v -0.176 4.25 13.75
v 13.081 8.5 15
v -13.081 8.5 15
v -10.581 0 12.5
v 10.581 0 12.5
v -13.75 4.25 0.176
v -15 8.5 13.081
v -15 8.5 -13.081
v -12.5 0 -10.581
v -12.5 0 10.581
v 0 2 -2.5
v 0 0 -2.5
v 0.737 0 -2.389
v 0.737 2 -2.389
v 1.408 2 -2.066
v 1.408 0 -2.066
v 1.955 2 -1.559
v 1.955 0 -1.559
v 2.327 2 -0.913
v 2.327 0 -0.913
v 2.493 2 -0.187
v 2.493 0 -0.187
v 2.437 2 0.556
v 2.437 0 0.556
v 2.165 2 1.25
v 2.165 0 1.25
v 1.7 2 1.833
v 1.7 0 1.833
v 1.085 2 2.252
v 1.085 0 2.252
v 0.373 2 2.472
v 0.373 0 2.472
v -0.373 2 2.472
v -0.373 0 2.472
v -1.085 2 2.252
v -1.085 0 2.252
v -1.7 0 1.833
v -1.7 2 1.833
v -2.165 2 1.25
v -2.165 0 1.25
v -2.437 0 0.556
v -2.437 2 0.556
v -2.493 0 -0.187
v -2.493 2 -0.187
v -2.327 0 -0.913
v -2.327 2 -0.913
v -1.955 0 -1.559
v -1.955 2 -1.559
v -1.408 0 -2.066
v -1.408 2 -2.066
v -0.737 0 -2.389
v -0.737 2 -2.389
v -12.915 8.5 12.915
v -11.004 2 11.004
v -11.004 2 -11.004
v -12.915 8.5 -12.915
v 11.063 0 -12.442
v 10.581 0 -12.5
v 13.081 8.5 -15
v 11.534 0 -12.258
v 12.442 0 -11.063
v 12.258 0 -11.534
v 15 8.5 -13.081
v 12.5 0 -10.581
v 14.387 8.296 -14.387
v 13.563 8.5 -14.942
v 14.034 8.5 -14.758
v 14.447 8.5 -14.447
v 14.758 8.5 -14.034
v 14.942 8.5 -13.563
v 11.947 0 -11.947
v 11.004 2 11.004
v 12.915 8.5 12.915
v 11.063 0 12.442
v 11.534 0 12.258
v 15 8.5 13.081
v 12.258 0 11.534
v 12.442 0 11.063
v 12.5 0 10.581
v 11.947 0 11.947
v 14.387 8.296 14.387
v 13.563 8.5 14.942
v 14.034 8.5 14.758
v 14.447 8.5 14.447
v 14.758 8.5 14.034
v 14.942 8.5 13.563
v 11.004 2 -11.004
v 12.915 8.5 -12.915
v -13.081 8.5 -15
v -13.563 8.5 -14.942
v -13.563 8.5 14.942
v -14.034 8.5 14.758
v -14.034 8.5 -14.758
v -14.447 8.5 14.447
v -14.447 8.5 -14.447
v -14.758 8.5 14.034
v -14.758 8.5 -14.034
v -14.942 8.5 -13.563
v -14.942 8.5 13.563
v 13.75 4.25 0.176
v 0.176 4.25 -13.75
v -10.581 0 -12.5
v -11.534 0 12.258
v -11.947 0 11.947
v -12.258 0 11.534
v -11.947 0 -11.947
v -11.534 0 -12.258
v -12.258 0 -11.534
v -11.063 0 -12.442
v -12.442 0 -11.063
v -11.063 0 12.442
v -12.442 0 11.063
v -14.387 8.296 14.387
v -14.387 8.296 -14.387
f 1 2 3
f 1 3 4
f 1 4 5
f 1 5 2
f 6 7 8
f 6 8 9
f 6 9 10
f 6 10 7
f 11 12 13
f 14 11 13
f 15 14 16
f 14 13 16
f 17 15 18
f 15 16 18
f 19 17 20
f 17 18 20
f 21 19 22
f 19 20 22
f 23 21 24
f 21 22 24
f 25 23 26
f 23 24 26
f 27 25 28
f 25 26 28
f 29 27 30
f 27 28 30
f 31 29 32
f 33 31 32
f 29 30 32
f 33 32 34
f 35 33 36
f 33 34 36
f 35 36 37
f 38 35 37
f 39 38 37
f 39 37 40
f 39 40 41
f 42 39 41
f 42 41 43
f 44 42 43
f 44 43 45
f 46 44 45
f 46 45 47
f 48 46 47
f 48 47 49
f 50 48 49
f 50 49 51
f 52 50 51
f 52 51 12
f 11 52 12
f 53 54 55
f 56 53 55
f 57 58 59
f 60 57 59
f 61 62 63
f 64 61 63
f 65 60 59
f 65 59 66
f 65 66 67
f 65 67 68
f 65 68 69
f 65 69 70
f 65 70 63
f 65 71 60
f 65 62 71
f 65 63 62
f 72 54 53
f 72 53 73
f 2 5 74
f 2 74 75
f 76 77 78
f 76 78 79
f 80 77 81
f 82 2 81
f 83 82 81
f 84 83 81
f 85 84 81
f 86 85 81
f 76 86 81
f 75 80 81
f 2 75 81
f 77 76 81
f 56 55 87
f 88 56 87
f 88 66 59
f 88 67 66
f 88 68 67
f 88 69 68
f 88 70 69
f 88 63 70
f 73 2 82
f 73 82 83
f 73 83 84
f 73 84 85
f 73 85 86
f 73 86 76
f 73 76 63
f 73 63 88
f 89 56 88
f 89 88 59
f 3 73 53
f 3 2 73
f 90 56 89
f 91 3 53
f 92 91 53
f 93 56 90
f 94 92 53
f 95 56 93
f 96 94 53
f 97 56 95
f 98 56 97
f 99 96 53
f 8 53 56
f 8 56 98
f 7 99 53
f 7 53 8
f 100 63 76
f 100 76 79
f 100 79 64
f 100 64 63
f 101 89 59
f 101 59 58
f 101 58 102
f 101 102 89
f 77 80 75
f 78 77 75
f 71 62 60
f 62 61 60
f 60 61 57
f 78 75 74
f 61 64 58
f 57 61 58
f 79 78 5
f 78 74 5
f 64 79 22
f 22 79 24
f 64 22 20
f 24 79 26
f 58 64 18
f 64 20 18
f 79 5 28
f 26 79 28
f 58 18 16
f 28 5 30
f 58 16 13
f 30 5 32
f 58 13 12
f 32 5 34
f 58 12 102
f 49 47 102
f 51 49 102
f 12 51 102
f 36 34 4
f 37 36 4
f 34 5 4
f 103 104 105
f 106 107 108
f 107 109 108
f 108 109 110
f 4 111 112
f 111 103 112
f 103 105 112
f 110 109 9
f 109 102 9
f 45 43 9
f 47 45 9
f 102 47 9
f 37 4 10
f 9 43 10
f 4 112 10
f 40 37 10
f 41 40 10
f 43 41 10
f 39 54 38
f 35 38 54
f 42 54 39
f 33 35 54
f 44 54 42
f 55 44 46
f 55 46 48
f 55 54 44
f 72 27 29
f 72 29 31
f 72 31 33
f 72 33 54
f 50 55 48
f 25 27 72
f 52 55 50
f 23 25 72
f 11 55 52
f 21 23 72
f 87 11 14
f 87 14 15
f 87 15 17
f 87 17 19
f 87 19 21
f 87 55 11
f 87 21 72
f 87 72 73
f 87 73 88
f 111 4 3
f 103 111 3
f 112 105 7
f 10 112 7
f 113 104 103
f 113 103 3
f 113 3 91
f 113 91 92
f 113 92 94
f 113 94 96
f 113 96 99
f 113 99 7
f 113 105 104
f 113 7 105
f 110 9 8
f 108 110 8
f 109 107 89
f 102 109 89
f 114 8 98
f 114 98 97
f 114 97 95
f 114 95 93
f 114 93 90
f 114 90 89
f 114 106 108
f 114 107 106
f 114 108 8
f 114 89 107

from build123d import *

# Parameters (mm, degrees)
FILLET1_R          = 2
SHELL2_OUTLINE_W   = 22.0070482
SHELL2_OUTLINE_H   = 22.0070482
SHELL2_DEPTH       = 6.5
SHELL2_DRAFT       = -16.3895403
SKETCH5_R          = 2.5
CUT_EXTRUDE1_DEPTH = 10


with BuildPart() as part:
    # Sketch3 → Loft1 section 0
    with BuildSketch(Plane(origin=(0, 8.5, 0), x_dir=(1, 0, 0), z_dir=(0, 1, 0))):
        with BuildLine():
            Line((15, -15), (-15, -15))
            Line((-15, -15), (-15, 15))
            Line((-15, 15), (15, 15))
            Line((15, 15), (15, -15))
        make_face()
    # Sketch2 → Loft1 section 1
    with BuildSketch(Plane(origin=(0, 0, 0), x_dir=(1, 0, 0), z_dir=(0, 1, 0))):
        with BuildLine():
            Line((12.5, -12.5), (-12.5, -12.5))
            Line((-12.5, -12.5), (-12.5, 12.5))
            Line((-12.5, 12.5), (12.5, 12.5))
            Line((12.5, 12.5), (12.5, -12.5))
        make_face()
    loft()

    # Fillet1
    fillet1_edges = [part.edges().sort_by_distance(p)[0] for p in [
        (13.75, 4.25, -13.75),
        (-13.75, 4.25, -13.75),
        (-13.75, 4.25, 13.75),
        (13.75, 4.25, 13.75),
    ]]
    fillet(fillet1_edges, radius=FILLET1_R)


with BuildPart() as shell2_tool:
    # Shell2: read off the stored shape, not the designer's step
    # Shell2 outline → Shell2 (with draft: the straight prism first)
    with BuildSketch(Plane(origin=(0, 2, 0), x_dir=(1, 0, 0), z_dir=(0, 1, 0))):
        Rectangle(SHELL2_OUTLINE_W, SHELL2_OUTLINE_H)
    extrude(amount=SHELL2_DEPTH)
    # Shell2: the draft: its side faces are tilted about the plane it starts from
    shell2_sides = [shell2_tool.faces().sort_by_distance(p)[0] for p in [
        (0, 5.25, -11.0035241),
        (-11.0035241, 5.25, 0),
        (0, 5.25, 11.0035241),
        (11.0035241, 5.25, 0),
    ]]
    draft(shell2_sides, Plane(origin=(0, 2, 0), x_dir=(1, 0, 0), z_dir=(0, 1, 0)), SHELL2_DRAFT)


with BuildPart() as part_1:
    add(part.part)

    # Shell2: cut by shell2_tool
    add(shell2_tool.part, mode=Mode.SUBTRACT)

    # Sketch5 → Cut-Extrude1 (cut)
    with BuildSketch(Plane.XZ):
        with Locations(Location((0, 0, 0), (0, 0, 270))):
            Circle(SKETCH5_R)
    extrude(amount=-CUT_EXTRUDE1_DEPTH, mode=Mode.SUBTRACT)


solid = part_1.part
